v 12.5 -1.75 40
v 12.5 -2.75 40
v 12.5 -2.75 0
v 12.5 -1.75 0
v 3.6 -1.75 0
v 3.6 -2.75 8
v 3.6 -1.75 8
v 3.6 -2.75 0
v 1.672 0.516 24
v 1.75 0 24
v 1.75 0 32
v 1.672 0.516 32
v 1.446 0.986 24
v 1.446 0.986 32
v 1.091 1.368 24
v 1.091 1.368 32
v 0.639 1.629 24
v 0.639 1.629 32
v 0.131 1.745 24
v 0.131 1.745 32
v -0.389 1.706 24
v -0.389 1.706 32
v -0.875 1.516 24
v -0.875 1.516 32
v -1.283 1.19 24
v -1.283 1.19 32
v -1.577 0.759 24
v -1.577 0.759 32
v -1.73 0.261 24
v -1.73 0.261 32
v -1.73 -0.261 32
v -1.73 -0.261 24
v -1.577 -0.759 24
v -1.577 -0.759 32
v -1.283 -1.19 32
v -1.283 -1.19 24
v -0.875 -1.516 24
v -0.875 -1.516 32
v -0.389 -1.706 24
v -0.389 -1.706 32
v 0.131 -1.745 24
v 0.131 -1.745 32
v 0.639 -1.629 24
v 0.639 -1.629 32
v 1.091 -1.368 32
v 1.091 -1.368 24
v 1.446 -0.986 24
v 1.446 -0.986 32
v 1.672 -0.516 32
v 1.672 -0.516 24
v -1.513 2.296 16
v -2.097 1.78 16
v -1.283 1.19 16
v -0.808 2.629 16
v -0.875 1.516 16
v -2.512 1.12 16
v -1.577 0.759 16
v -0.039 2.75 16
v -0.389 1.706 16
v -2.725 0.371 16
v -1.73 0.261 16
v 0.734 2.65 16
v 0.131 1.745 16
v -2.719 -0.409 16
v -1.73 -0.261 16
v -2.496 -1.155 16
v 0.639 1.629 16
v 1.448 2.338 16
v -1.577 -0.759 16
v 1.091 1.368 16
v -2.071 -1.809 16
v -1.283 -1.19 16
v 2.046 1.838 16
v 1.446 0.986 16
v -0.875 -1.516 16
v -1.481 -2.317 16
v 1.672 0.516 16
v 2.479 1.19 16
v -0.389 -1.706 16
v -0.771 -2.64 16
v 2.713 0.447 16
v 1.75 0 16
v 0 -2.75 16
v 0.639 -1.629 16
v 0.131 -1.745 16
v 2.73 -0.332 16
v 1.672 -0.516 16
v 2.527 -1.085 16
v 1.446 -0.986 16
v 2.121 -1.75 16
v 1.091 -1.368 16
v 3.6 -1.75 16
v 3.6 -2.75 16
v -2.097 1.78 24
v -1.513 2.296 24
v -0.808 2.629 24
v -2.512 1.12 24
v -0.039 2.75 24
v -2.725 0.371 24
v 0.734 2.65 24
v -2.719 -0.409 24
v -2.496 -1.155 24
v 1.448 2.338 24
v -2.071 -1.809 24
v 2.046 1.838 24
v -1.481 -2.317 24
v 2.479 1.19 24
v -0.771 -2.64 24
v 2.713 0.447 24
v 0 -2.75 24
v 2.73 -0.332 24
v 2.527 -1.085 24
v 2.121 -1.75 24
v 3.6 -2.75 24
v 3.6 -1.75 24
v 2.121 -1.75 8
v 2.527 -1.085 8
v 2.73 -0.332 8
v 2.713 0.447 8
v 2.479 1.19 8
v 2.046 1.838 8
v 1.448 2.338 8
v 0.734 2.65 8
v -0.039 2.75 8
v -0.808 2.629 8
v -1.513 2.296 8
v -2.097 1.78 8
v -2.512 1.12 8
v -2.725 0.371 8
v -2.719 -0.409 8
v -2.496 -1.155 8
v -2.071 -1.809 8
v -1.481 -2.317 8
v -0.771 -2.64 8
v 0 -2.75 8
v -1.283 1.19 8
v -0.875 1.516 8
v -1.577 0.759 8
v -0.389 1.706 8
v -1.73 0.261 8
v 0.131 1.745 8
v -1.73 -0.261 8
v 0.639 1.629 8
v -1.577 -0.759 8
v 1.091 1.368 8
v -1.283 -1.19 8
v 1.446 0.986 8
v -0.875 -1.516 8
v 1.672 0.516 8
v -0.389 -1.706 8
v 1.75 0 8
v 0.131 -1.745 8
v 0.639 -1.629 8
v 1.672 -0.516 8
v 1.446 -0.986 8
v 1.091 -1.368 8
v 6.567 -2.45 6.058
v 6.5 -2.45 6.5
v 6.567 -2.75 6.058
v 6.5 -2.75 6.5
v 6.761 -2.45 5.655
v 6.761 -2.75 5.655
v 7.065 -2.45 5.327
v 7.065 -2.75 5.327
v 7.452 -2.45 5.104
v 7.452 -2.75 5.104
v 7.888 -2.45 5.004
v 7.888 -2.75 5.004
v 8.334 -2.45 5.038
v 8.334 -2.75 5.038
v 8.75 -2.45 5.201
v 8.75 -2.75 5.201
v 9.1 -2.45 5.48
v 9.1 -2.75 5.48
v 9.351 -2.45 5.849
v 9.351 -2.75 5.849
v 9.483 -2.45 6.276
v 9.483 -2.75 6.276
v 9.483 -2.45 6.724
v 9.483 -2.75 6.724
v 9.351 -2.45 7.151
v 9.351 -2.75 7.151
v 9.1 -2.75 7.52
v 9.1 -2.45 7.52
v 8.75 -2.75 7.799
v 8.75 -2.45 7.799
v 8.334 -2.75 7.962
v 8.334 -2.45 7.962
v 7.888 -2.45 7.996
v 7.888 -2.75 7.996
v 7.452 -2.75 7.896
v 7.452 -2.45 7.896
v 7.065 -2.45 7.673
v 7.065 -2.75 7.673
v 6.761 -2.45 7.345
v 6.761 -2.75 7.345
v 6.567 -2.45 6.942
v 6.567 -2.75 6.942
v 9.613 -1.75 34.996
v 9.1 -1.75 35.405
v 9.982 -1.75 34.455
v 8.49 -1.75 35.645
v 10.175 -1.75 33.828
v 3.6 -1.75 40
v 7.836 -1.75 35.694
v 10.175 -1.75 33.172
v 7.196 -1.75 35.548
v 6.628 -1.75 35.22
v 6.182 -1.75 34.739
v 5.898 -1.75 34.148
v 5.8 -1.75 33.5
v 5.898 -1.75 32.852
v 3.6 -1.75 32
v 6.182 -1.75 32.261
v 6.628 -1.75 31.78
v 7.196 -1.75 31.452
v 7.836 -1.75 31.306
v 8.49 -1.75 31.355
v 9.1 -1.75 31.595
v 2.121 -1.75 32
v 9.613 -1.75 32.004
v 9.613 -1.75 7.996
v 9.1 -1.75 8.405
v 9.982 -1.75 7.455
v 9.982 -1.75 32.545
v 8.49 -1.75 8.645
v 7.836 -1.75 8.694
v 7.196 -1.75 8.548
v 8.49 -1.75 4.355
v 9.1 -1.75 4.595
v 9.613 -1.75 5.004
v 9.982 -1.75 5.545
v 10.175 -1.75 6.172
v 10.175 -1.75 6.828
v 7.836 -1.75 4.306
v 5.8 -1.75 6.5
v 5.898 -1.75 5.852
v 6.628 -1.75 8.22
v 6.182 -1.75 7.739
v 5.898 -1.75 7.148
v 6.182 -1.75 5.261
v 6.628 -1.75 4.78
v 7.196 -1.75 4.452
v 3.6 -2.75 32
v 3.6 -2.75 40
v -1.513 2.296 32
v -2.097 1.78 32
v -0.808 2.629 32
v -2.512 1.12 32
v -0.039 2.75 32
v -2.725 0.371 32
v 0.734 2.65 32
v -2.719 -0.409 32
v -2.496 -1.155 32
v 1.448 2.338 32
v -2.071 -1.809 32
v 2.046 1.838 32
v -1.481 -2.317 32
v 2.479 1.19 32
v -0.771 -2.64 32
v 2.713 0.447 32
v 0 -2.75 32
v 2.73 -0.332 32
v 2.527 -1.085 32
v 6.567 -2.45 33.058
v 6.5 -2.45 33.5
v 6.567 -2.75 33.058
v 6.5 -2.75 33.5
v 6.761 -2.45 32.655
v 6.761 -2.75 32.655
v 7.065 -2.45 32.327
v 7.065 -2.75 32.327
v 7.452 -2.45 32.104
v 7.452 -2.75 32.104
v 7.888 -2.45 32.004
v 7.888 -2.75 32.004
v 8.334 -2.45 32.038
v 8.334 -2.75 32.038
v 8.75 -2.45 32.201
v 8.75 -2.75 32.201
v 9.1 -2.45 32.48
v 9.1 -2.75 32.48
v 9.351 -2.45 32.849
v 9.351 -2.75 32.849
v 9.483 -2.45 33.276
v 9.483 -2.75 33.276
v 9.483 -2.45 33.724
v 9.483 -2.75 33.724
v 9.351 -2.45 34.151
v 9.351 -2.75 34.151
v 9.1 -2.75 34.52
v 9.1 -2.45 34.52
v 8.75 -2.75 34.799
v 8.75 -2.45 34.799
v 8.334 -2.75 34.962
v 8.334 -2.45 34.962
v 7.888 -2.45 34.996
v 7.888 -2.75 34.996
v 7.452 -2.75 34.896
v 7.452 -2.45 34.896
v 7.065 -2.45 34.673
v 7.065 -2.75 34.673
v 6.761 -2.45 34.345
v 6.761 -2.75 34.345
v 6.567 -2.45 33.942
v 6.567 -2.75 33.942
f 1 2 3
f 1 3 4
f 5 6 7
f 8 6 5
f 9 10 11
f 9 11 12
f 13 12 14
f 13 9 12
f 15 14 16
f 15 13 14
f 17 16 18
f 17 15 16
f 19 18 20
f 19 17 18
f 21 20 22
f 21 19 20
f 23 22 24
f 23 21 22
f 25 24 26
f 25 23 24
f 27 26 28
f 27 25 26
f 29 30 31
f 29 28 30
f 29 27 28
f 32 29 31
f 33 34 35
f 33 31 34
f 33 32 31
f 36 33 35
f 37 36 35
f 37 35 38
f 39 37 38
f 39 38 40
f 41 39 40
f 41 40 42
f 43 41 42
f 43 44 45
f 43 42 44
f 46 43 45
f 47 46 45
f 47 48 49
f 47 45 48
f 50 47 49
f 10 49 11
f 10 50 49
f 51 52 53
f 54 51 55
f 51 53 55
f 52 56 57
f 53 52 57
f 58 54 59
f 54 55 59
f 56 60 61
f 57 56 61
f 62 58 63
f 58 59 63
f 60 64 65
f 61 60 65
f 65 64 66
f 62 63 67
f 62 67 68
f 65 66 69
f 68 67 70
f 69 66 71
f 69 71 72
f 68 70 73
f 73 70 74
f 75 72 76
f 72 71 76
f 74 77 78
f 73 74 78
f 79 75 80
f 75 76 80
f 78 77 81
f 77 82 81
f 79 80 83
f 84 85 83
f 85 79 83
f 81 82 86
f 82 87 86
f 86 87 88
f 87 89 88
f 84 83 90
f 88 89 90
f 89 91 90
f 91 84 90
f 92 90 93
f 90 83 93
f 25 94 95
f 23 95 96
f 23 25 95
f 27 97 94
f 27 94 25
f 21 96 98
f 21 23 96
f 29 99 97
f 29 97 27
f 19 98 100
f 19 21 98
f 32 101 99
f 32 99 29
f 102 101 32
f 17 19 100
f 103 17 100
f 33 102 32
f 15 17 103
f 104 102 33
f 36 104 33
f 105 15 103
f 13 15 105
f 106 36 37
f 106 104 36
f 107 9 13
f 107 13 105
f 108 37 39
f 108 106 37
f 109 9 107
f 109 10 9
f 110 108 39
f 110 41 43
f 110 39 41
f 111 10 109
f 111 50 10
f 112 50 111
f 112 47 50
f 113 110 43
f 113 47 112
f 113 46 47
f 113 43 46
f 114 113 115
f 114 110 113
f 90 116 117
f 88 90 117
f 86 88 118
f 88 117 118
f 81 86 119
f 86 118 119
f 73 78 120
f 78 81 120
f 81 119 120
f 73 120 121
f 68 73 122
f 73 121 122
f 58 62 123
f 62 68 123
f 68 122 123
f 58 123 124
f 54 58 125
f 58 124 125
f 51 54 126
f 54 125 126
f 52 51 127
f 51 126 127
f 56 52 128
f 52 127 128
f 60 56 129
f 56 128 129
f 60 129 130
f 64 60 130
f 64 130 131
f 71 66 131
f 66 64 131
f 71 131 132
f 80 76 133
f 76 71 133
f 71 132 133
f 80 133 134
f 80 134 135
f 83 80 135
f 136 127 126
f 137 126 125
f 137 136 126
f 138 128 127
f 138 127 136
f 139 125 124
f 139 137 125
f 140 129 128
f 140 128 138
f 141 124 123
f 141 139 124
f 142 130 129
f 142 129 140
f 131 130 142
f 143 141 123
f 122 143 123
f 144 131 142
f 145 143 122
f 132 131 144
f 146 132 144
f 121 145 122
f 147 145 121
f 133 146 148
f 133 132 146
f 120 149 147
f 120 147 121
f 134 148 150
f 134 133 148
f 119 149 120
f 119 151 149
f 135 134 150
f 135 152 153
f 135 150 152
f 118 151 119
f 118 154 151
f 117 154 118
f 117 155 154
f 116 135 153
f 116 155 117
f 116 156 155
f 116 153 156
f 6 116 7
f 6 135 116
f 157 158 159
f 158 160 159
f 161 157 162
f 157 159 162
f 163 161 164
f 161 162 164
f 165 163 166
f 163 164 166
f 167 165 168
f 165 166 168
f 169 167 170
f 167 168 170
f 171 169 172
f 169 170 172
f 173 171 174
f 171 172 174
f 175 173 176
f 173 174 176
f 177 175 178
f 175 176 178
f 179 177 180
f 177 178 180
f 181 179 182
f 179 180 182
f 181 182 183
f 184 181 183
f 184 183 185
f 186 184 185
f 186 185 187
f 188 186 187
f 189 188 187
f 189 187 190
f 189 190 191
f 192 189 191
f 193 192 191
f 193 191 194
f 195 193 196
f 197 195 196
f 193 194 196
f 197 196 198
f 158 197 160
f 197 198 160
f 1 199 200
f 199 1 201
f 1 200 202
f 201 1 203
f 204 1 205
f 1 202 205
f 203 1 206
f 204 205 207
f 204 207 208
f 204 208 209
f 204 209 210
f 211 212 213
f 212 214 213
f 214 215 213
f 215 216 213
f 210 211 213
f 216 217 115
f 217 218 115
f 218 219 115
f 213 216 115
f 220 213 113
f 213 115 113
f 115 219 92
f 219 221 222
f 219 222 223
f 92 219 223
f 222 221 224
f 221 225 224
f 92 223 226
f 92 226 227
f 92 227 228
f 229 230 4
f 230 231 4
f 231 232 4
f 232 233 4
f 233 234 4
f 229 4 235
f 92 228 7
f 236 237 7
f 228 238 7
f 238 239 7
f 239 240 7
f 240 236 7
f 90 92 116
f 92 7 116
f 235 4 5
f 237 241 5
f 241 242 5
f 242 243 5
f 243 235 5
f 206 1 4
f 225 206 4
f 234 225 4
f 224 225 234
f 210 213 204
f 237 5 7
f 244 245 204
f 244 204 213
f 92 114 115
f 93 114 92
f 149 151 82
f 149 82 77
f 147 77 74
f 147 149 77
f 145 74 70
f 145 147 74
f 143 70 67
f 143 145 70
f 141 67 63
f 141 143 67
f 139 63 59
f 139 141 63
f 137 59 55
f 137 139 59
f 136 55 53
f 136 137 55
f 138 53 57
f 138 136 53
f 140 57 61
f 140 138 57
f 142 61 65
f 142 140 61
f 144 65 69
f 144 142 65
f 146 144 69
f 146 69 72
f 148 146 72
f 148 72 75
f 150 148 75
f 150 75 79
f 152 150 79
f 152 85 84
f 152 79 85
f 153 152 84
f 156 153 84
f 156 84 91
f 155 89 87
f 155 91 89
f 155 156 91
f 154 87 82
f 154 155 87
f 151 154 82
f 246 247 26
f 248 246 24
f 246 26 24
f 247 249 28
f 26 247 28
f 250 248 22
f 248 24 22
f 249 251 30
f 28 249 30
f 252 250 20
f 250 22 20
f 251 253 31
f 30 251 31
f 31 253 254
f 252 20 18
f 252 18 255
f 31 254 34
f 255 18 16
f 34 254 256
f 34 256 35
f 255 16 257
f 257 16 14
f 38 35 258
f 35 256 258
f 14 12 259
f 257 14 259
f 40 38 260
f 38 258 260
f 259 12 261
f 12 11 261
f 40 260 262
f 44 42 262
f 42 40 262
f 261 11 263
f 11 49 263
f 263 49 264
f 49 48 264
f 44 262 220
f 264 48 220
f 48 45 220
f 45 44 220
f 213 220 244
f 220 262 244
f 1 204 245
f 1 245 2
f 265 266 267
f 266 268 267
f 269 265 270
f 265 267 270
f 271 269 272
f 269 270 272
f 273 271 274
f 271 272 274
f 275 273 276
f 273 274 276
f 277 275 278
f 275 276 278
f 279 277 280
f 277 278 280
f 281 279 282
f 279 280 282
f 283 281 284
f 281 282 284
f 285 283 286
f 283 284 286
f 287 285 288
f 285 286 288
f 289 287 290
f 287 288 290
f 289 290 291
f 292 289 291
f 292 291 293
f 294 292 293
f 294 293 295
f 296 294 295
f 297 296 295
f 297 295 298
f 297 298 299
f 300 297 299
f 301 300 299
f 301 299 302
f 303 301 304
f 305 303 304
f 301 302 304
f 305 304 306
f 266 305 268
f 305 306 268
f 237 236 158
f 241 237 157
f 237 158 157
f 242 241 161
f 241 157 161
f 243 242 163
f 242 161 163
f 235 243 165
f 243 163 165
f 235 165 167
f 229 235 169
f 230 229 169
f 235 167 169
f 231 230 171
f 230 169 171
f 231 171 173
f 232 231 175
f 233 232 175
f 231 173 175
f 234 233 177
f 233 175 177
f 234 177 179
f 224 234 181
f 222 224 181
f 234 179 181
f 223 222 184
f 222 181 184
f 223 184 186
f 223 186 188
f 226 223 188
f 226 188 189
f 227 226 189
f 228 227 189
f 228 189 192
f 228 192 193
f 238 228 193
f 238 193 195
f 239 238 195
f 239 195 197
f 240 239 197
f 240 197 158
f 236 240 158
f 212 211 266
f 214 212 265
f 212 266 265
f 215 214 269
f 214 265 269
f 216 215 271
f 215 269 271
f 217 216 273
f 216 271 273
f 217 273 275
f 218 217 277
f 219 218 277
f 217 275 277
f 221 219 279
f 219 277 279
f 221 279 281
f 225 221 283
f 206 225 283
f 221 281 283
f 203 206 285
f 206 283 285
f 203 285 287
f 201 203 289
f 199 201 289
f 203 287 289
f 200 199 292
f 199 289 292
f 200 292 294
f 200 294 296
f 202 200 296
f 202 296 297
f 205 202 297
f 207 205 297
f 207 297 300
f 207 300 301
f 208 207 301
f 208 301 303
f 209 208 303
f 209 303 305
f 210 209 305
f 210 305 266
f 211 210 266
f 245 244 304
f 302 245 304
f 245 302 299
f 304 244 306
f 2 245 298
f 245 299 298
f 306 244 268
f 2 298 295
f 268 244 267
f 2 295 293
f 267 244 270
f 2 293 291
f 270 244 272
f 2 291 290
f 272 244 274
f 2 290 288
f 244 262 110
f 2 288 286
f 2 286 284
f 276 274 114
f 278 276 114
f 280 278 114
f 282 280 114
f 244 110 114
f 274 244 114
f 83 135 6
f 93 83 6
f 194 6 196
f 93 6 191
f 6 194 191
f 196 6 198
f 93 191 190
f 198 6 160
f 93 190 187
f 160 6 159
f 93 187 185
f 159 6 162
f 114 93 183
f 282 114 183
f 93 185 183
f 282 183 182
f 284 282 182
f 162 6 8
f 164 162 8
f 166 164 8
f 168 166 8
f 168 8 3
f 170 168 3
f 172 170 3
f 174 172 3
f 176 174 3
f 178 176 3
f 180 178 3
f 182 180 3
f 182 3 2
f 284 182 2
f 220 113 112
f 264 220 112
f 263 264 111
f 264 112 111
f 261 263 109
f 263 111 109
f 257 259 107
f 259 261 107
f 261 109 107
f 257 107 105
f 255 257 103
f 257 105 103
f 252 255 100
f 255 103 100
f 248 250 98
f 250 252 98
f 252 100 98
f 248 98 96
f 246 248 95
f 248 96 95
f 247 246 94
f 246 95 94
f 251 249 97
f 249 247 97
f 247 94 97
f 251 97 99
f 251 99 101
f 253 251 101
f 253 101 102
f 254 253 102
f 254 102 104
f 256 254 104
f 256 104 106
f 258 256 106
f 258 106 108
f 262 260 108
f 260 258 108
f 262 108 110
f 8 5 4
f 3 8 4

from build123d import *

# Parameters (mm, degrees)
ESQUISSE1_R                  = 1.75
BOSS_EXTRU_1_DEPTH           = 40
ENL_V_MAT_EXTRU_3_DEPTH      = 20
ENL_V_MAT_EXTRU_3_DEPTH_BACK = 20
ESQUISSE2_W                  = 17.8
ESQUISSE2_H                  = 8
D_GAGEMENT_M31_D             = 3
D_GAGEMENT_M31_DEPTH         = 10
D_GAGEMENT_M31_CSINK_D       = 4.4
D_GAGEMENT_M31_CSINK_ANGLE   = 90
D_GAGEMENT_M31_TIP           = 0.901290929


with BuildPart() as part:
    # Esquisse1 → Boss.-Extru.1 (new body)
    with BuildSketch(Plane.XY):
        with BuildLine():
            Line((12.5, -1.75), (2.121320344, -1.75))
            ThreePointArc((2.121320344, -1.75), (-1.17260394, 2.487468593), (0, -2.75))
            Line((0, -2.75), (12.5, -2.75))
            Line((12.5, -2.75), (12.5, -1.75))
        make_face()
        Circle(ESQUISSE1_R, mode=Mode.SUBTRACT)
    extrude(amount=BOSS_EXTRU_1_DEPTH)

    # Esquisse2 → Enlèv. mat.-Extru.3 (cut, two sides: drawn at the far end of the back side and taken through both)
    with BuildSketch(Plane(origin=(0, -1.75, 0), x_dir=(1, 0, 0), z_dir=(0, 1, 0)).offset(-ENL_V_MAT_EXTRU_3_DEPTH_BACK)):
        with Locations((-5.3, -20)):
            Rectangle(ESQUISSE2_W, ESQUISSE2_H)
        with Locations((-5.3, -36)):
            Rectangle(ESQUISSE2_W, ESQUISSE2_H)
        with Locations((-5.3, -4)):
            Rectangle(ESQUISSE2_W, ESQUISSE2_H)
    extrude(amount=ENL_V_MAT_EXTRU_3_DEPTH + ENL_V_MAT_EXTRU_3_DEPTH_BACK, mode=Mode.SUBTRACT)

    # Dégagement M31
    with Locations(Plane(origin=(0, -1.75, 0), x_dir=(1, 0, 0), z_dir=(0, 1, 0))):
        with Locations((8, -33.5), (8, -6.5)):
            CounterSinkHole(D_GAGEMENT_M31_D / 2, D_GAGEMENT_M31_CSINK_D / 2, depth=D_GAGEMENT_M31_DEPTH, counter_sink_angle=D_GAGEMENT_M31_CSINK_ANGLE)
            with Locations((0, 0, -(D_GAGEMENT_M31_DEPTH + D_GAGEMENT_M31_TIP / 2))):  # 118° drill point
                Cone(0, D_GAGEMENT_M31_D / 2, D_GAGEMENT_M31_TIP, mode=Mode.SUBTRACT)


solid = part.part
